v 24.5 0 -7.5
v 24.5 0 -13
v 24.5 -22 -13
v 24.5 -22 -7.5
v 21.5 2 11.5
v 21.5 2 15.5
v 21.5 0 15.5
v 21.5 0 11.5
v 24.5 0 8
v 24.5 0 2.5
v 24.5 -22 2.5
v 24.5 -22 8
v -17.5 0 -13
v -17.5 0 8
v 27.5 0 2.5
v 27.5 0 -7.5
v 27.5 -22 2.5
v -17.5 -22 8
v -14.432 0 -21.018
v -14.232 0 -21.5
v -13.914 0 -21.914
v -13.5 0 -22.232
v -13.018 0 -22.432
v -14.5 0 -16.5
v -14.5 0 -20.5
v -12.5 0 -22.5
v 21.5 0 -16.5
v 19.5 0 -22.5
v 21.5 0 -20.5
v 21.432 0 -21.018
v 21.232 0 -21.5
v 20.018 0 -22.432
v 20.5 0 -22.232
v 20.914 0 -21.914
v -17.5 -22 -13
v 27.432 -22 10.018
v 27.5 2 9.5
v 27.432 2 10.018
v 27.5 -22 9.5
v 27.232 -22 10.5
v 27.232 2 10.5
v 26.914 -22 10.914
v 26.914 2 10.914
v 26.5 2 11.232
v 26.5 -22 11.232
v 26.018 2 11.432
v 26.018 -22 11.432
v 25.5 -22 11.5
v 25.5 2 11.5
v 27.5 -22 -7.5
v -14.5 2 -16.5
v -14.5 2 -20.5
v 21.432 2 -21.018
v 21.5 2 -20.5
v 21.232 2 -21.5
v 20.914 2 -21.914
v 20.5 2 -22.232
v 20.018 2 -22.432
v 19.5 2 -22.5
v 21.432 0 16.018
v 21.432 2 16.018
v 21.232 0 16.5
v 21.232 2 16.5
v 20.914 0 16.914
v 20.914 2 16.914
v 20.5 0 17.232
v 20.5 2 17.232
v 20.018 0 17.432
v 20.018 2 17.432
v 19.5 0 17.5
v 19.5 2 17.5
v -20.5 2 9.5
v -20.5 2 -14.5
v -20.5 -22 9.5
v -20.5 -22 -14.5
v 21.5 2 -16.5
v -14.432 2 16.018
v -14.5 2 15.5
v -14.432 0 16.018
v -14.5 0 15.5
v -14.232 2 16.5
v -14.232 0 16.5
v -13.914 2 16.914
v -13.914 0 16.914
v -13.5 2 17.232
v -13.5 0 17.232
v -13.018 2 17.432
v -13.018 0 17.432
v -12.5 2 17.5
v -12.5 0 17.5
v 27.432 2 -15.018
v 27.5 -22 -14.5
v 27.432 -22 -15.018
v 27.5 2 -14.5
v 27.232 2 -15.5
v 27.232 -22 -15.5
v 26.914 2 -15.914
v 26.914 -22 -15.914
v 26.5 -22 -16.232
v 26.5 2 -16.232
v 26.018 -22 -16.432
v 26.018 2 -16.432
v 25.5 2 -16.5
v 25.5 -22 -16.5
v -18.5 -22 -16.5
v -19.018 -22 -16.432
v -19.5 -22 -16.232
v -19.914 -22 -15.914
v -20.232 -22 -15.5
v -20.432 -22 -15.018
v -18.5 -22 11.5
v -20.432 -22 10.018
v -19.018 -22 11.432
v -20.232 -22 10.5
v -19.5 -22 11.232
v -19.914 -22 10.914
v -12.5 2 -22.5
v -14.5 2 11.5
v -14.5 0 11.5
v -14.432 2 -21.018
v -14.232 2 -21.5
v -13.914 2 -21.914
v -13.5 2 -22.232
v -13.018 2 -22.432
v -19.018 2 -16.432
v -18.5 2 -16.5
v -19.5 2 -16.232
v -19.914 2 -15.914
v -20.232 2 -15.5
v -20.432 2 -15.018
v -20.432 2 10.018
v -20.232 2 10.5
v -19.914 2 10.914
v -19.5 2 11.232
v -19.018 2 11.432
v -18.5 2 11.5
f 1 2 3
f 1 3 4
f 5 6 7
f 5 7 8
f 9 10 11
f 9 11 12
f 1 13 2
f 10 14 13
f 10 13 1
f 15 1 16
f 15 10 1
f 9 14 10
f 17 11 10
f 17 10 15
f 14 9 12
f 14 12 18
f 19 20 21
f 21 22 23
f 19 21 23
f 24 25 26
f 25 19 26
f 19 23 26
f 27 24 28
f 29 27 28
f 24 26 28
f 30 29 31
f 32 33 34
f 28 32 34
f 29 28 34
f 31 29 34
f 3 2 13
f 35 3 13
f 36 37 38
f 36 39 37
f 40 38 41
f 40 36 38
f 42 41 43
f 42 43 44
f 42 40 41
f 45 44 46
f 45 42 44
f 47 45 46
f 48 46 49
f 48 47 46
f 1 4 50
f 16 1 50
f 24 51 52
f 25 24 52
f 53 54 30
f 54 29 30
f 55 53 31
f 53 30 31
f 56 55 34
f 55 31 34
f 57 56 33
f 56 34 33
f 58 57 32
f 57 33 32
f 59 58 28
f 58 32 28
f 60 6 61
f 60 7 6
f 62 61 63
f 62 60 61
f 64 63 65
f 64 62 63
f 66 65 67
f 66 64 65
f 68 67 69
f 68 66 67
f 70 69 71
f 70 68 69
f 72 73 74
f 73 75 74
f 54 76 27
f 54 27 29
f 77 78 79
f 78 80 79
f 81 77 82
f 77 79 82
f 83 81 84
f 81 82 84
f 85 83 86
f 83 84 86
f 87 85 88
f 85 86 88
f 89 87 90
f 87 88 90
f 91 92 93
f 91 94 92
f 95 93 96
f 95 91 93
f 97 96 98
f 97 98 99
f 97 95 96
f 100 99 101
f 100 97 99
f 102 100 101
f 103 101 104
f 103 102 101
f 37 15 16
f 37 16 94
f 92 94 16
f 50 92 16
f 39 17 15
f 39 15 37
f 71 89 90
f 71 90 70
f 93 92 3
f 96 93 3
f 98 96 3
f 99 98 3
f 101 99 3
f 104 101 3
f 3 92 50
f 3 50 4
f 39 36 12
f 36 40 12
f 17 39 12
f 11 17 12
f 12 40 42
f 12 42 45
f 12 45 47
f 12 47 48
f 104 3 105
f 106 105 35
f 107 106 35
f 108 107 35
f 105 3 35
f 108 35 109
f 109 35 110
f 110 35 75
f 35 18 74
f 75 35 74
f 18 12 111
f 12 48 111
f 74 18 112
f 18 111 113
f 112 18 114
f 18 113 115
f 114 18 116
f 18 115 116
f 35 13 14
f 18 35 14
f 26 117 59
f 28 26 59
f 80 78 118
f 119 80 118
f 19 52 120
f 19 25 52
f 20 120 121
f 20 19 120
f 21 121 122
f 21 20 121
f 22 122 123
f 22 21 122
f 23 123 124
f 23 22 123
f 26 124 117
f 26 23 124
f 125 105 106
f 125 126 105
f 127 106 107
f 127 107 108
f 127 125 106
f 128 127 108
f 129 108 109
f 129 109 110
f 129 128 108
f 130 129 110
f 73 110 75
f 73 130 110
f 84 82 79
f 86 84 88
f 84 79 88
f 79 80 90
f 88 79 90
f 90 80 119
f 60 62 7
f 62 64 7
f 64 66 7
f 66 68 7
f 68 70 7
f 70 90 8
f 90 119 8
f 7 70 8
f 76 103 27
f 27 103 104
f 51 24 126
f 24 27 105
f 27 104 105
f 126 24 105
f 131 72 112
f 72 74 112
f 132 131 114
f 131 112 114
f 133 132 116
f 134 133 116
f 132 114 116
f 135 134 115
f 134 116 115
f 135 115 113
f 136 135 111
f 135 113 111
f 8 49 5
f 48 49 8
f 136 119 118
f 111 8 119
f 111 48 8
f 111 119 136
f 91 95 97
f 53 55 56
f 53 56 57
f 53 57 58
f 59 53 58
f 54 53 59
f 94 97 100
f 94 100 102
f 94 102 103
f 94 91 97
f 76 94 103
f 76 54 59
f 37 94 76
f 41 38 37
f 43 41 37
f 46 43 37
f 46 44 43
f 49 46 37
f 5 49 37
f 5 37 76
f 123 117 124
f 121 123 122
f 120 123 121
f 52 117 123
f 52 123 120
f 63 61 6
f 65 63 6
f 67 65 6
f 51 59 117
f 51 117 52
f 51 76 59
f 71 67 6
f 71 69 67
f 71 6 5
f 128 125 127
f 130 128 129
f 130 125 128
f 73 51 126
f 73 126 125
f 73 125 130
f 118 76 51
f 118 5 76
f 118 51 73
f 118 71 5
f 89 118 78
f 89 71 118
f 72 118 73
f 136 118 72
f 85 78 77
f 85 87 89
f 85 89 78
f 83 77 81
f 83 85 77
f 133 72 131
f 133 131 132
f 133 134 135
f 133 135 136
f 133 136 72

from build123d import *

# Parameters (mm, degrees)
SKETCH6_W            = 48
SKETCH6_H            = 28
SKETCH6_W_2          = 42
SKETCH6_H_2          = 21
BOSS_EXTRUDE20_DEPTH = 22
SKETCH9_W            = 48
SKETCH9_H            = 28
BOSS_EXTRUDE22_DEPTH = 2
FILLET1_R            = 2
SKETCH11_W           = 36
SKETCH11_H           = 6
BOSS_EXTRUDE23_DEPTH = 2
FILLET2_R            = 2
SKETCH12_W           = 3
SKETCH12_H           = 10
CUT_EXTRUDE2_DEPTH   = 22


with BuildPart() as part:
    # Sketch6 → Boss-Extrude20 (new body)
    with BuildSketch(Plane(origin=(0, 0, 0), x_dir=(-1, 0, 0), z_dir=(0, 1, 0))):
        with Locations((-3.5, -2.5)):
            Rectangle(SKETCH6_W, SKETCH6_H)
        with Locations((-3.5, -2.5)):
            Rectangle(SKETCH6_W_2, SKETCH6_H_2, mode=Mode.SUBTRACT)
    extrude(amount=-BOSS_EXTRUDE20_DEPTH)

    # Sketch9 → Boss-Extrude22 (add)
    with BuildSketch(Plane(origin=(0, 0, 0), x_dir=(-1, 0, 0), z_dir=(0, 1, 0))):
        with Locations((-3.5, -2.5)):
            Rectangle(SKETCH9_W, SKETCH9_H)
    extrude(amount=BOSS_EXTRUDE22_DEPTH)

    # Fillet1
    fillet1_edges = [part.edges().sort_by_distance(p)[0] for p in [
        (27.5, -10, 11.5),
        (-20.5, -10, 11.5),
        (-20.5, -10, -16.5),
        (27.5, -10, -16.5),
    ]]
    fillet(fillet1_edges, radius=FILLET1_R)

    # Sketch11 → Boss-Extrude23 (add)
    with BuildSketch(Plane(origin=(0, 2, 0), x_dir=(1, 0, 0), z_dir=(0, 1, 0))):
        with Locations((3.5, 19.5)):
            Rectangle(SKETCH11_W, SKETCH11_H)
        with Locations((3.5, -14.5)):
            Rectangle(SKETCH11_W, SKETCH11_H)
    extrude(amount=-BOSS_EXTRUDE23_DEPTH)

    # Fillet2
    fillet2_edges = [part.edges().sort_by_distance(p)[0] for p in [
        (-14.5, 1, -22.5),
        (21.5, 1, -22.5),
        (21.5, 1, 17.5),
        (-14.5, 1, 17.5),
    ]]
    fillet(fillet2_edges, radius=FILLET2_R)

    # Sketch12 → Cut-Extrude2 (cut)
    with BuildSketch(Plane.XZ.offset(22)):
        with Locations((26, -2.5)):
            Rectangle(SKETCH12_W, SKETCH12_H)
    extrude(amount=-CUT_EXTRUDE2_DEPTH, mode=Mode.SUBTRACT)


solid = part.part
